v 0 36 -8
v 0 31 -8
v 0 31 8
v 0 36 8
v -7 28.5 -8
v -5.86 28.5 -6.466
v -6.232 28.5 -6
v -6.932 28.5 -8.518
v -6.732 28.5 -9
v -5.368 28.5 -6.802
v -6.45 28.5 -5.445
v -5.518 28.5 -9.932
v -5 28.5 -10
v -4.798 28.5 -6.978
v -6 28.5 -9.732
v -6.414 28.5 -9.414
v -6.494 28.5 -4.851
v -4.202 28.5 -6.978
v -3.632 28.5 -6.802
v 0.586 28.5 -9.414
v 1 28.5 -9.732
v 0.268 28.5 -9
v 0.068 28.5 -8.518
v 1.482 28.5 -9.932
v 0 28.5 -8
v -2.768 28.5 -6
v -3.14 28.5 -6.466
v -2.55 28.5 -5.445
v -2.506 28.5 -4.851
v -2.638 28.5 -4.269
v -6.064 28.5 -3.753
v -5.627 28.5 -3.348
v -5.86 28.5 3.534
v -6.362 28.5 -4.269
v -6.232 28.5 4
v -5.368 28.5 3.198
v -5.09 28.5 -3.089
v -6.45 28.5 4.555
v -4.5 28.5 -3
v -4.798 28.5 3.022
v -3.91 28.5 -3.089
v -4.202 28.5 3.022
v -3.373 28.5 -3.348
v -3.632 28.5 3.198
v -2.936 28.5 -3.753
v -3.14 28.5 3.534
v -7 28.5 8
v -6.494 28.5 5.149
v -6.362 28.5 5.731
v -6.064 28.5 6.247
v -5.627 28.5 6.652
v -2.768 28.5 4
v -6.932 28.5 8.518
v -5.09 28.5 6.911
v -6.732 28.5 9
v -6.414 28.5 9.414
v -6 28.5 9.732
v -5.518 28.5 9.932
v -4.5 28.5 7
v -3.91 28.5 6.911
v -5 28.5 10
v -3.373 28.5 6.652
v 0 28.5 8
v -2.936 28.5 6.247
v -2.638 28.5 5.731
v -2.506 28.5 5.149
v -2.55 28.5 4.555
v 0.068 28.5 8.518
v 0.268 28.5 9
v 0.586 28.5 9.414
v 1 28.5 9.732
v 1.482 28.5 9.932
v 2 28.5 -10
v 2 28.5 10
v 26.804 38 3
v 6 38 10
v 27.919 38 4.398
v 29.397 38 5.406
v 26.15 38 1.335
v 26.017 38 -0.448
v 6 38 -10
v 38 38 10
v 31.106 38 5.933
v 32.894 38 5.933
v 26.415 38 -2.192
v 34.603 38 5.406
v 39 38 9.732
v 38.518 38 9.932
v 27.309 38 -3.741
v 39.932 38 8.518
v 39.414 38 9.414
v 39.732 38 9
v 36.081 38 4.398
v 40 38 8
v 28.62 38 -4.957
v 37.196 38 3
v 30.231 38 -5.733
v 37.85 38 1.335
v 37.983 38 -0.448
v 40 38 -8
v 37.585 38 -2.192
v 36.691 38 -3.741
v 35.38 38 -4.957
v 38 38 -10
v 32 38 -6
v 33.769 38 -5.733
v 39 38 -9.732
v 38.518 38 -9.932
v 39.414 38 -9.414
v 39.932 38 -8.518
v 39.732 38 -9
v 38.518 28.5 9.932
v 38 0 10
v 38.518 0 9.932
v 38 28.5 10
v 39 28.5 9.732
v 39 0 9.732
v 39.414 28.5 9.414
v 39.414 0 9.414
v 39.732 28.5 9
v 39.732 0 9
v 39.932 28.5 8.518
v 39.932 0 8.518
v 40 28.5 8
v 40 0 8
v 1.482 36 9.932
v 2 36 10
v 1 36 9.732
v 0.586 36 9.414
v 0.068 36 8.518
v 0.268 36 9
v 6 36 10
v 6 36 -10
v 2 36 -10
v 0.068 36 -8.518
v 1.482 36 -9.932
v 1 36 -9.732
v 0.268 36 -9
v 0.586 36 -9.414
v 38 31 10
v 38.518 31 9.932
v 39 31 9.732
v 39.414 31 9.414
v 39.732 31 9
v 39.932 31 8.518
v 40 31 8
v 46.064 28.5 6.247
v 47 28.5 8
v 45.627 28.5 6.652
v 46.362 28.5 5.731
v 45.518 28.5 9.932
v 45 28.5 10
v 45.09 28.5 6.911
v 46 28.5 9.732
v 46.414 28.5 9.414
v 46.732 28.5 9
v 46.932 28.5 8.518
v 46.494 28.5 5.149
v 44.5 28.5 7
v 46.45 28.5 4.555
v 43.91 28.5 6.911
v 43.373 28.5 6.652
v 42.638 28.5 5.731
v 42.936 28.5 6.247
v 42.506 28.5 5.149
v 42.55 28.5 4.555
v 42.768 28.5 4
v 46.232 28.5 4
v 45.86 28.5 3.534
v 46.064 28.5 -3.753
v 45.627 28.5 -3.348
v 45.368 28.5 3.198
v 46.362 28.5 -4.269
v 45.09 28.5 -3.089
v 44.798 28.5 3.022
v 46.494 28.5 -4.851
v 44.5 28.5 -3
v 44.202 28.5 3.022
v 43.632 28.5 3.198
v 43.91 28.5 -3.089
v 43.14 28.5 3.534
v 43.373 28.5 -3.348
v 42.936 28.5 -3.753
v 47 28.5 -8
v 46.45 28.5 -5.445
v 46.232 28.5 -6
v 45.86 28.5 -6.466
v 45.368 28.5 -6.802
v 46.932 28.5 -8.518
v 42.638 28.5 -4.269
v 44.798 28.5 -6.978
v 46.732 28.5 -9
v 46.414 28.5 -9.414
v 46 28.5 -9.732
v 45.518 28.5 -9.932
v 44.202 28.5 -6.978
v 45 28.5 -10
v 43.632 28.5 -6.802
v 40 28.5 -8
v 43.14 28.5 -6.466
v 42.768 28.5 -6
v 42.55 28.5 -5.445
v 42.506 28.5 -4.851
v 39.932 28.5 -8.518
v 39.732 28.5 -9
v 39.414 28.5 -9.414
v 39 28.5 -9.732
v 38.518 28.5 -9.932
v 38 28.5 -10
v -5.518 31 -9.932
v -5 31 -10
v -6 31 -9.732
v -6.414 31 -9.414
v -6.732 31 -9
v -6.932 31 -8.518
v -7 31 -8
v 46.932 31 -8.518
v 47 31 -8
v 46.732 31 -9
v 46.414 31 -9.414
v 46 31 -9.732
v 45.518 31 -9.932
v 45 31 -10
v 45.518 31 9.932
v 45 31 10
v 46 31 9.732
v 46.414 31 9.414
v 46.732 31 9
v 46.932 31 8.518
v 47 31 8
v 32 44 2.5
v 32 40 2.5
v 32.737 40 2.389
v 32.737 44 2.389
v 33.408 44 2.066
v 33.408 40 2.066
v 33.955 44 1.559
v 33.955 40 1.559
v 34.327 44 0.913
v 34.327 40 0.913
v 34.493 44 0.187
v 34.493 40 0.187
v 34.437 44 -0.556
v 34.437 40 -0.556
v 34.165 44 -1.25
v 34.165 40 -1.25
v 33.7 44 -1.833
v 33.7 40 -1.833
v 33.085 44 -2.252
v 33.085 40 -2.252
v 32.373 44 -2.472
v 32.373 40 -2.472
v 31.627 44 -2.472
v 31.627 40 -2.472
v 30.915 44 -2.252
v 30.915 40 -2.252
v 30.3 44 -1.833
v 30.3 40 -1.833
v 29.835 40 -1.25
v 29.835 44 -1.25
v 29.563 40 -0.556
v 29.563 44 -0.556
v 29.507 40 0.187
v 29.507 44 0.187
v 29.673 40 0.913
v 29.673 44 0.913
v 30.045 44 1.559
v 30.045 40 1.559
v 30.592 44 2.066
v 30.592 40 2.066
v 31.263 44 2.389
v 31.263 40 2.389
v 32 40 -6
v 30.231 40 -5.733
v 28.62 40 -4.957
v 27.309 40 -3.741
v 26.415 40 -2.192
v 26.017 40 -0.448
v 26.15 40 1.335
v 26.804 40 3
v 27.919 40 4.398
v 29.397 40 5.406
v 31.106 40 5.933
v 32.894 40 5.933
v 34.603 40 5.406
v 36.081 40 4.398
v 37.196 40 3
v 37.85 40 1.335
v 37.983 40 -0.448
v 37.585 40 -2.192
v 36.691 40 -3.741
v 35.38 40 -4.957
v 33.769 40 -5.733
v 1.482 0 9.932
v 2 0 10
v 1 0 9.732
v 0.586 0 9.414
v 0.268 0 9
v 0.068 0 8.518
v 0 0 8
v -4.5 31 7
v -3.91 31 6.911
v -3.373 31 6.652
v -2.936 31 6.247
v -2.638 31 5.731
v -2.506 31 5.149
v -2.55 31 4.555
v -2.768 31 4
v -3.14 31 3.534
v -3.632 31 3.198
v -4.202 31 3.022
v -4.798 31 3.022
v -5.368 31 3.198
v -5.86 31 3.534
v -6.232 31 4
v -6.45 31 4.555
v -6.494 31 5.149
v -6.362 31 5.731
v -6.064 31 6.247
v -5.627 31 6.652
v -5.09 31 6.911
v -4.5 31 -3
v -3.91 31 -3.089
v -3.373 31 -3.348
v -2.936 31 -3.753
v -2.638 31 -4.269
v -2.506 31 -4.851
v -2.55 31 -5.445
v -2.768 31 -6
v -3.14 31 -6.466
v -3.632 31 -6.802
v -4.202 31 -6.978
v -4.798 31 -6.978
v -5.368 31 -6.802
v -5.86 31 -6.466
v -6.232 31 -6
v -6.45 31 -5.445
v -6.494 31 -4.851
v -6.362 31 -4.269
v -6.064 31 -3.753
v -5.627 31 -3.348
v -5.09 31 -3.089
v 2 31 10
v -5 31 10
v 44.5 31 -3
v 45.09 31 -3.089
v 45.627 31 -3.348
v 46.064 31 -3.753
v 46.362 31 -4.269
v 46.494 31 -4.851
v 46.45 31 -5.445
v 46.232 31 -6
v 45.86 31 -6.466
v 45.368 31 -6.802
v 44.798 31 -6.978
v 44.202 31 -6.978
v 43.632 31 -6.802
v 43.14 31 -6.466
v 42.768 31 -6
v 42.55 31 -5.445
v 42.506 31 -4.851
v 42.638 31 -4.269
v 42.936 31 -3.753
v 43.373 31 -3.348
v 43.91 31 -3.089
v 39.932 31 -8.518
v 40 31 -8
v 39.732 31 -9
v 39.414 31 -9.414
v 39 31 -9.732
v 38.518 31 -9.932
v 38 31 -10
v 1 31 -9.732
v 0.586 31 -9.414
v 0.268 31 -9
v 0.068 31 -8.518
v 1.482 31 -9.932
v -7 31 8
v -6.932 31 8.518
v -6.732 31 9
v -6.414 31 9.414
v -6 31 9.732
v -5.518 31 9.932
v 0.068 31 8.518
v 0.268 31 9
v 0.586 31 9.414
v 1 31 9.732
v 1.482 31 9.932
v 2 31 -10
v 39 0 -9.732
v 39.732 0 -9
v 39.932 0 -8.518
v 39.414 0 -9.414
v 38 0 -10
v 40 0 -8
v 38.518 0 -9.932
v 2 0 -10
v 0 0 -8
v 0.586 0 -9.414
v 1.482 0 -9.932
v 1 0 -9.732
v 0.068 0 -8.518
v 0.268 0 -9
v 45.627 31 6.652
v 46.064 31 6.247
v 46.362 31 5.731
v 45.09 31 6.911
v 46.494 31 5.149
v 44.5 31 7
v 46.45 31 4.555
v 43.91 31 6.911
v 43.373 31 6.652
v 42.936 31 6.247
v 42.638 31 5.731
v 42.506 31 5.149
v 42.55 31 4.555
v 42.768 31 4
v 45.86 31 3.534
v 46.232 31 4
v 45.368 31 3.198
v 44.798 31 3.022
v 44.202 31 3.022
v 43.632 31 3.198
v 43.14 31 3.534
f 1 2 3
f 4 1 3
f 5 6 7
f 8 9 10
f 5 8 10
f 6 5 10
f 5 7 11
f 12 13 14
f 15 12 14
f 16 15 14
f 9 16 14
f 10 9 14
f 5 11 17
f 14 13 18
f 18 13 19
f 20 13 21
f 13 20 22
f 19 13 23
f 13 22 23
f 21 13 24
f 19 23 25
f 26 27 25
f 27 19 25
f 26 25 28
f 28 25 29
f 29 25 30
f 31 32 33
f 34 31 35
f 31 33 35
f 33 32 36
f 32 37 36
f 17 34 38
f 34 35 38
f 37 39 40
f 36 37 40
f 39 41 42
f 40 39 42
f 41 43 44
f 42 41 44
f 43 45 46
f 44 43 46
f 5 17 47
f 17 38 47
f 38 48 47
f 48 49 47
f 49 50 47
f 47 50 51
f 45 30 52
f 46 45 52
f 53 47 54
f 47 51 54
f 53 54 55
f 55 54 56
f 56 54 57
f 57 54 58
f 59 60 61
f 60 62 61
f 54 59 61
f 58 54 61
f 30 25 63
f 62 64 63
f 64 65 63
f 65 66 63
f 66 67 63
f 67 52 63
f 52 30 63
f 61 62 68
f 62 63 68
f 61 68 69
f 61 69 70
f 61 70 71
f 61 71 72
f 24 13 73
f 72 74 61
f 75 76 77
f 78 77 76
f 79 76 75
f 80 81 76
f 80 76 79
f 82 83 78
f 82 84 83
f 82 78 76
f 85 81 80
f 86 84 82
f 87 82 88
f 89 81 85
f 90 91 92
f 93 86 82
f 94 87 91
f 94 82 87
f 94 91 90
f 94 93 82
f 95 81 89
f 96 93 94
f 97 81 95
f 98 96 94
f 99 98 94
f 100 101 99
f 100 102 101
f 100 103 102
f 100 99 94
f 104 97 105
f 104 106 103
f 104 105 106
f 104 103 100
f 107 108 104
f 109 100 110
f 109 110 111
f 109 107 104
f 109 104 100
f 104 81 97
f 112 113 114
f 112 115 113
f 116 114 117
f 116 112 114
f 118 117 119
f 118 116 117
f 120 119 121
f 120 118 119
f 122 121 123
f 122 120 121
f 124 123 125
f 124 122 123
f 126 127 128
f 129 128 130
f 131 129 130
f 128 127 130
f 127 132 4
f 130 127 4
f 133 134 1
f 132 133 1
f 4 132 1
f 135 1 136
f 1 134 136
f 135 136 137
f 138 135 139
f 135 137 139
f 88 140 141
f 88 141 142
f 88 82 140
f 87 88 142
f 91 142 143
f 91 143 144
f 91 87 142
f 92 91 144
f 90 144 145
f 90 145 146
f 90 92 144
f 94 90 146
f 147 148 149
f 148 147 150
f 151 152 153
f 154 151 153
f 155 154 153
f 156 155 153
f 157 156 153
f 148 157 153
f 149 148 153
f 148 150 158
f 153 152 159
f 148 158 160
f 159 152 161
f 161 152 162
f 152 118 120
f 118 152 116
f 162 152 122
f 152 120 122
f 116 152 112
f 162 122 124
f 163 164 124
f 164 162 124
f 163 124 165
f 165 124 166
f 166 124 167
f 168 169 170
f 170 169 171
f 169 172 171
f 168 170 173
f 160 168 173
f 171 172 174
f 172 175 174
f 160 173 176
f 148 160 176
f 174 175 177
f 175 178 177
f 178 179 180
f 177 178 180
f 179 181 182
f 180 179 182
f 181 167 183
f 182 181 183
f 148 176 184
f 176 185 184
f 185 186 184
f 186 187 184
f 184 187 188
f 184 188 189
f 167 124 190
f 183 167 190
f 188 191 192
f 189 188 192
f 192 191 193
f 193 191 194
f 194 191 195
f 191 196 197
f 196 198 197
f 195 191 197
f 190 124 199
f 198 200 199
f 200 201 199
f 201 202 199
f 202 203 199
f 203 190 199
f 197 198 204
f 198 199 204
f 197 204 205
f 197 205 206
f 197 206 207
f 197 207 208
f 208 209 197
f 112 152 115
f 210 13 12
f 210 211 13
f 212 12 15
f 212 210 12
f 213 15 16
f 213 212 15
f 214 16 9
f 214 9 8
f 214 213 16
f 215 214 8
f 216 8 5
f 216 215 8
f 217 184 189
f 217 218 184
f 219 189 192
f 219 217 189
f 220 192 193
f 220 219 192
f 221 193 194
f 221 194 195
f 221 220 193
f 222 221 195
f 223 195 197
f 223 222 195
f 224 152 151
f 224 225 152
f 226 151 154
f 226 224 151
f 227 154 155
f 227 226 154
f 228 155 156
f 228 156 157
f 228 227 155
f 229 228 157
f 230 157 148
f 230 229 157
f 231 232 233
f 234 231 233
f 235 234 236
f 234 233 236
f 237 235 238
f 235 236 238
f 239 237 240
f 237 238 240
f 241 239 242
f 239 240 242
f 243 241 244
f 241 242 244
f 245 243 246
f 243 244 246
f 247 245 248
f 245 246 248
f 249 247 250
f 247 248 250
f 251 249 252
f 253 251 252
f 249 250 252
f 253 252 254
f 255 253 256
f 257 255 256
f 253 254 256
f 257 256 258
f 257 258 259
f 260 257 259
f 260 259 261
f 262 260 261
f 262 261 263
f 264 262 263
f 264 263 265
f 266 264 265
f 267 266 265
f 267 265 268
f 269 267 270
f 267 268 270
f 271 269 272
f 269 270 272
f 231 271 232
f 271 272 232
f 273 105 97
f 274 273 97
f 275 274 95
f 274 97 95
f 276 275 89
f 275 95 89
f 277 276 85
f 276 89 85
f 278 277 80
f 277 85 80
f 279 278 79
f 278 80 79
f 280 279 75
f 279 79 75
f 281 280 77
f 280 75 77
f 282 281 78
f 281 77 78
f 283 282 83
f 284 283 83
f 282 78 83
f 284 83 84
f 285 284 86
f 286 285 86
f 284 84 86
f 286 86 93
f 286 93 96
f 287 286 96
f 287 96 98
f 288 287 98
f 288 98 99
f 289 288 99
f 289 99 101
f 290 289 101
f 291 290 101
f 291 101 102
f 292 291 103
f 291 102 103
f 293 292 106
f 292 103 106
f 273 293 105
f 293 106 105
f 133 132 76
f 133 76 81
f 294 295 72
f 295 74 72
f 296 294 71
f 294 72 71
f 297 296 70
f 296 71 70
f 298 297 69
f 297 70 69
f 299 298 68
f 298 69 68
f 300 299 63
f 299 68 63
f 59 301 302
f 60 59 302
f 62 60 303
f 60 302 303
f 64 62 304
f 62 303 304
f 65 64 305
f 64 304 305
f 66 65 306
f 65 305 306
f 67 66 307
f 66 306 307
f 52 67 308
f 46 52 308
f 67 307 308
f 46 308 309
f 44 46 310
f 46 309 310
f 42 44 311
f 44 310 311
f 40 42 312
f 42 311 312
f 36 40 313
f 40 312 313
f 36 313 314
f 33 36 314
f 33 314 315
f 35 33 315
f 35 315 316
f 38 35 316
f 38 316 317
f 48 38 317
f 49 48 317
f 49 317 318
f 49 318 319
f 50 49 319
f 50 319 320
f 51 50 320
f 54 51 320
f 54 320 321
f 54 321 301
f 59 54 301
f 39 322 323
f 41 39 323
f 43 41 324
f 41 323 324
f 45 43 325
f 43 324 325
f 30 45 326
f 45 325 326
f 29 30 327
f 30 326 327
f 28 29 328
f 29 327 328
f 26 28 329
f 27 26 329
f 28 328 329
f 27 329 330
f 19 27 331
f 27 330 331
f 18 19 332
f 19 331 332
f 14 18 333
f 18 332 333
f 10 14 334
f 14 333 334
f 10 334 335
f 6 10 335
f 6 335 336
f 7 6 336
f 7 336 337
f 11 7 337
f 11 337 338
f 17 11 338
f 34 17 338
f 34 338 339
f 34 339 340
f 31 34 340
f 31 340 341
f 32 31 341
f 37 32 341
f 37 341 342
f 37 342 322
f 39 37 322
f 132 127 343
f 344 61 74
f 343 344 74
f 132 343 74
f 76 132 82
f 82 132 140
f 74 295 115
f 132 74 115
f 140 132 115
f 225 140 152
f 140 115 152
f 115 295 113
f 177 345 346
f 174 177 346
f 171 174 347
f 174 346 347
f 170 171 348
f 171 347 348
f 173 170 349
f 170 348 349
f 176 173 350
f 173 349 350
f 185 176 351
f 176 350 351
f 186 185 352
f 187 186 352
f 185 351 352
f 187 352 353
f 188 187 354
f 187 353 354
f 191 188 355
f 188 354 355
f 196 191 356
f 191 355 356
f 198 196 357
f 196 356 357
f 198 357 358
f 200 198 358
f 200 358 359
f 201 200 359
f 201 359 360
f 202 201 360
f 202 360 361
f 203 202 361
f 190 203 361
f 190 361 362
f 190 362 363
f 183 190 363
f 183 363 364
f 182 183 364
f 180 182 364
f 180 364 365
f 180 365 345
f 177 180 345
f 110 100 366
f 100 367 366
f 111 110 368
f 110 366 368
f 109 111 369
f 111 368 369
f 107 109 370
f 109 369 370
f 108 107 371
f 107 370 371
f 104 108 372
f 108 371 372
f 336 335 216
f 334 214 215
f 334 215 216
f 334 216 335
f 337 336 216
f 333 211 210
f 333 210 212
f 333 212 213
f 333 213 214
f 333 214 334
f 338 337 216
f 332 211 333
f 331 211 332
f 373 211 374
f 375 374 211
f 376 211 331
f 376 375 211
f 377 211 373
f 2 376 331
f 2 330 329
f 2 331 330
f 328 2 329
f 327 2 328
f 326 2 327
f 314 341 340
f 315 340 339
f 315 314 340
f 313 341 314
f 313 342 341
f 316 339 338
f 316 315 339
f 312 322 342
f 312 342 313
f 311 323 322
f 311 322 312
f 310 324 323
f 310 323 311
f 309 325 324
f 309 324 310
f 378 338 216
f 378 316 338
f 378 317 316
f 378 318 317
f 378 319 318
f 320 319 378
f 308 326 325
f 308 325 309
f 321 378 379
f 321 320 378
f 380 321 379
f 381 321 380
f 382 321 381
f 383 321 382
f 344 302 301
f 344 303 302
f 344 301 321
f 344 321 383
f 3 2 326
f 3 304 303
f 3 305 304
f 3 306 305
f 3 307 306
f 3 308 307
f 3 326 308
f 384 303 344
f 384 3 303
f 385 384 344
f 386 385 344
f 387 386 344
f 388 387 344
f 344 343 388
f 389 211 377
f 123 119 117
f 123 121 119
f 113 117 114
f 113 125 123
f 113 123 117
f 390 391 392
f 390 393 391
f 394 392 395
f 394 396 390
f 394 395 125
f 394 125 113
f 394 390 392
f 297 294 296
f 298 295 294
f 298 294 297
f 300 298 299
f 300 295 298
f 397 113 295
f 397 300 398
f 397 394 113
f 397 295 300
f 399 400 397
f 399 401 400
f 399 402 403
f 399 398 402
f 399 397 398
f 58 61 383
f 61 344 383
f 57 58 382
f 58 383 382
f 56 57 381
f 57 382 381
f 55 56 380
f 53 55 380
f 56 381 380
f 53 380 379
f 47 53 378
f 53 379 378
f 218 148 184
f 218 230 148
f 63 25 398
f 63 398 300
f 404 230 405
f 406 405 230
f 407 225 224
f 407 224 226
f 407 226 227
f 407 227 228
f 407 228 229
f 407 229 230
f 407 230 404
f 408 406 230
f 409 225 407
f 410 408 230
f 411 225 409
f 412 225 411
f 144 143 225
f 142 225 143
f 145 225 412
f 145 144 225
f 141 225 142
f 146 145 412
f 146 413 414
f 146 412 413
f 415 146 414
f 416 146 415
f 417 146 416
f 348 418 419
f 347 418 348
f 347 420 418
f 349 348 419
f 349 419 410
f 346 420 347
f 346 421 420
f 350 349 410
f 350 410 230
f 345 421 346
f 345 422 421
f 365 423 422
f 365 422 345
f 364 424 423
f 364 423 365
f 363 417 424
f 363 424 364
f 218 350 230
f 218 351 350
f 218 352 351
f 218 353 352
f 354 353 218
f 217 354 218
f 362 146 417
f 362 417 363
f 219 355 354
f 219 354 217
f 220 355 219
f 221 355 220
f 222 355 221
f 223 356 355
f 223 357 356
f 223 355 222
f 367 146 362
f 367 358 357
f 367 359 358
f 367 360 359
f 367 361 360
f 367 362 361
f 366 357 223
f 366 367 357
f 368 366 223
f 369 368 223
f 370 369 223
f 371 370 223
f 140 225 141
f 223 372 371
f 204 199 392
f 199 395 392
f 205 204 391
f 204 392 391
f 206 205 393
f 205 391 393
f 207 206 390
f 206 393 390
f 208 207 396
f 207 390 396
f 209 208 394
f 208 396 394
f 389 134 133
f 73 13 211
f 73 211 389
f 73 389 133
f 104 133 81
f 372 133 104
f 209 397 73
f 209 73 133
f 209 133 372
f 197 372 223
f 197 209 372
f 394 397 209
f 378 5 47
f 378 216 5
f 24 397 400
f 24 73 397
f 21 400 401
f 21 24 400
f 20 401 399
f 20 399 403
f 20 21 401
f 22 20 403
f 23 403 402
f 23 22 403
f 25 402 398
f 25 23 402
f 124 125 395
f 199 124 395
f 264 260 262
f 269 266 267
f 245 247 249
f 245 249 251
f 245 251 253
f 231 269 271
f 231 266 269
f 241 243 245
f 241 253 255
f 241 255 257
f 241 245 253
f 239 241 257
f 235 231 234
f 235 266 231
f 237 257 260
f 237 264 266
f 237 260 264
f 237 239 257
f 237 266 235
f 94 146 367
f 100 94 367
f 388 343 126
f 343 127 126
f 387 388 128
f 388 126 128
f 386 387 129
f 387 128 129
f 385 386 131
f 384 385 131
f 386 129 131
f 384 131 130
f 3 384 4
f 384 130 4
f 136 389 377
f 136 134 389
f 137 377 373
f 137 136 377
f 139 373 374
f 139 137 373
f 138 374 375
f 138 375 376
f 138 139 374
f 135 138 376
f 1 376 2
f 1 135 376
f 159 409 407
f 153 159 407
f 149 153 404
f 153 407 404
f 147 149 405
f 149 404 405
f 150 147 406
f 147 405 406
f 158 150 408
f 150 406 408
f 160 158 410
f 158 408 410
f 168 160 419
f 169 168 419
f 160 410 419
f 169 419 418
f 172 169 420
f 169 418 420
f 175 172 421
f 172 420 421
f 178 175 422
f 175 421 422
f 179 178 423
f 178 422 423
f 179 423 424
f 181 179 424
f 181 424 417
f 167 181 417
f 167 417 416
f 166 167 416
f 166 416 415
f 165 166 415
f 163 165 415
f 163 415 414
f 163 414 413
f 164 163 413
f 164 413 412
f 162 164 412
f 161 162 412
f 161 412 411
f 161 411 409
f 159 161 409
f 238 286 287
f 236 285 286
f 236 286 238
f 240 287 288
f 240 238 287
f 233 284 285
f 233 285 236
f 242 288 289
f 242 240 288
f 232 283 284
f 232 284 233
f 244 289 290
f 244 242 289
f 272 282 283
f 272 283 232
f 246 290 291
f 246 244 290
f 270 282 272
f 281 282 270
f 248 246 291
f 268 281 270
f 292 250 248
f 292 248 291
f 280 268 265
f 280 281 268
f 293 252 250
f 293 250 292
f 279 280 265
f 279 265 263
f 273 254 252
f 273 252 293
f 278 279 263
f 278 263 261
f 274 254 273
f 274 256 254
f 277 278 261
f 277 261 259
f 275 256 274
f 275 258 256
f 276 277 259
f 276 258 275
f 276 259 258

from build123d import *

# Parameters (mm, degrees)
BOSS_EXTRU_1_DEPTH      = 36
ESQUISSE2_W             = 34
ESQUISSE2_H             = 20
BOSS_EXTRU_2_DEPTH      = 2
ESQUISSE3_R             = 6
BOSS_EXTRU_3_DEPTH      = 2
ESQUISSE4_R             = 2.5
BOSS_EXTRU_4_DEPTH      = 4
ESQUISSE5_W             = 20
ESQUISSE5_H             = 2.5
BOSS_EXTRU_5_DEPTH      = 7
ENL_V_MAT_EXTRU_1_REACH = 53.585
ESQUISSE6_R             = 2
CONG_1_R                = 2
ESQUISSE7_W             = 20
ESQUISSE7_H             = 2.5
BOSS_EXTRU_6_DEPTH      = 7
ENL_V_MAT_EXTRU_2_REACH = 59.184
ESQUISSE8_R             = 2
CONG_2_R                = 2


with BuildPart() as part:
    # Esquisse1 → Boss.-Extru.1 (new body)
    with BuildSketch(Plane(origin=(0, 0, 0), x_dir=(1, 0, 0), z_dir=(0, 1, 0))):
        Polygon((0, 0), (0, 10), (40, 10), (40, -10), (0, -10), align=None)
    extrude(amount=BOSS_EXTRU_1_DEPTH)

    # Esquisse2 → Boss.-Extru.2 (add)
    with BuildSketch(Plane(origin=(0, 36, 0), x_dir=(1, 0, 0), z_dir=(0, 1, 0))):
        with Locations((23, 0)):
            Rectangle(ESQUISSE2_W, ESQUISSE2_H)
    extrude(amount=BOSS_EXTRU_2_DEPTH)

    # Esquisse3 → Boss.-Extru.3 (add)
    with BuildSketch(Plane(origin=(0, 38, 0), x_dir=(1, 0, 0), z_dir=(0, 1, 0))):
        with Locations(Location((32, 0, 0), (0, 0, 90))):
            Circle(ESQUISSE3_R)
    extrude(amount=BOSS_EXTRU_3_DEPTH)

    # Esquisse4 → Boss.-Extru.4 (add)
    with BuildSketch(Plane(origin=(0, 40, 0), x_dir=(1, 0, 0), z_dir=(0, 1, 0))):
        with Locations(Location((32, 0, 0), (0, 0, 270))):
            Circle(ESQUISSE4_R)
    extrude(amount=BOSS_EXTRU_4_DEPTH)

    # Esquisse5 → Boss.-Extru.5 (add)
    with BuildSketch(Plane.ZY):
        with Locations((0, 29.75)):
            Rectangle(ESQUISSE5_W, ESQUISSE5_H)
    extrude(amount=BOSS_EXTRU_5_DEPTH)

    # Esquisse6 → Enlèv. mat.-Extru.1 (cut, up to next)
    with BuildSketch(Plane(origin=(0, 31, 0), x_dir=(1, 0, 0), z_dir=(0, 1, 0)), mode=Mode.PRIVATE) as enl_v_mat_extru_1_sk1:
        with Locations(Location((-4.5, 5, 0), (0, 0, 270))):
            Circle(ESQUISSE6_R)
    enl_v_mat_extru_1_tool1 = extrude(enl_v_mat_extru_1_sk1.sketch, amount=-ENL_V_MAT_EXTRU_1_REACH, mode=Mode.PRIVATE) & part.part
    # Esquisse6 → Enlèv. mat.-Extru.1 (cut, up to next)
    with BuildSketch(Plane(origin=(0, 31, 0), x_dir=(1, 0, 0), z_dir=(0, 1, 0)), mode=Mode.PRIVATE) as enl_v_mat_extru_1_sk2:
        with Locations(Location((-4.5, -5, 0), (0, 0, 270))):
            Circle(ESQUISSE6_R)
    enl_v_mat_extru_1_tool2 = extrude(enl_v_mat_extru_1_sk2.sketch, amount=-ENL_V_MAT_EXTRU_1_REACH, mode=Mode.PRIVATE) & part.part
    add(enl_v_mat_extru_1_tool1.solids().sort_by_distance((-4.5, 31, -5))[0], mode=Mode.SUBTRACT)
    add(enl_v_mat_extru_1_tool2.solids().sort_by_distance((-4.5, 31, 5))[0], mode=Mode.SUBTRACT)

    # Congé1
    cong_1_edges = [part.edges().sort_by_distance(p)[0] for p in [
        (0, 14.25, 10),
        (0, 14.25, -10),
        (-7, 29.75, -10),
        (-7, 29.75, 10),
        (0, 33.5, -10),
        (0, 33.5, 10),
    ]]
    fillet(cong_1_edges, radius=CONG_1_R)

    # Esquisse7 → Boss.-Extru.6 (add)
    with BuildSketch(Plane(origin=(40, 0, 0), x_dir=(0, 0, -1), z_dir=(1, 0, 0))):
        with Locations((0, 29.75)):
            Rectangle(ESQUISSE7_W, ESQUISSE7_H)
    extrude(amount=BOSS_EXTRU_6_DEPTH)

    # Esquisse8 → Enlèv. mat.-Extru.2 (cut, up to next)
    with BuildSketch(Plane(origin=(0, 31, 0), x_dir=(1, 0, 0), z_dir=(0, 1, 0)), mode=Mode.PRIVATE) as enl_v_mat_extru_2_sk1:
        with Locations(Location((44.5, 5, 0), (0, 0, 270))):
            Circle(ESQUISSE8_R)
    enl_v_mat_extru_2_tool1 = extrude(enl_v_mat_extru_2_sk1.sketch, amount=-ENL_V_MAT_EXTRU_2_REACH, mode=Mode.PRIVATE) & part.part
    # Esquisse8 → Enlèv. mat.-Extru.2 (cut, up to next)
    with BuildSketch(Plane(origin=(0, 31, 0), x_dir=(1, 0, 0), z_dir=(0, 1, 0)), mode=Mode.PRIVATE) as enl_v_mat_extru_2_sk2:
        with Locations(Location((44.5, -5, 0), (0, 0, 270))):
            Circle(ESQUISSE8_R)
    enl_v_mat_extru_2_tool2 = extrude(enl_v_mat_extru_2_sk2.sketch, amount=-ENL_V_MAT_EXTRU_2_REACH, mode=Mode.PRIVATE) & part.part
    add(enl_v_mat_extru_2_tool1.solids().sort_by_distance((44.5, 31, -5))[0], mode=Mode.SUBTRACT)
    add(enl_v_mat_extru_2_tool2.solids().sort_by_distance((44.5, 31, 5))[0], mode=Mode.SUBTRACT)

    # Congé2
    cong_2_edges = [part.edges().sort_by_distance(p)[0] for p in [
        (40, 14.25, -10),
        (40, 14.25, 10),
        (47, 29.75, 10),
        (47, 29.75, -10),
        (40, 34.5, -10),
        (40, 34.5, 10),
    ]]
    fillet(cong_2_edges, radius=CONG_2_R)


solid = part.part
